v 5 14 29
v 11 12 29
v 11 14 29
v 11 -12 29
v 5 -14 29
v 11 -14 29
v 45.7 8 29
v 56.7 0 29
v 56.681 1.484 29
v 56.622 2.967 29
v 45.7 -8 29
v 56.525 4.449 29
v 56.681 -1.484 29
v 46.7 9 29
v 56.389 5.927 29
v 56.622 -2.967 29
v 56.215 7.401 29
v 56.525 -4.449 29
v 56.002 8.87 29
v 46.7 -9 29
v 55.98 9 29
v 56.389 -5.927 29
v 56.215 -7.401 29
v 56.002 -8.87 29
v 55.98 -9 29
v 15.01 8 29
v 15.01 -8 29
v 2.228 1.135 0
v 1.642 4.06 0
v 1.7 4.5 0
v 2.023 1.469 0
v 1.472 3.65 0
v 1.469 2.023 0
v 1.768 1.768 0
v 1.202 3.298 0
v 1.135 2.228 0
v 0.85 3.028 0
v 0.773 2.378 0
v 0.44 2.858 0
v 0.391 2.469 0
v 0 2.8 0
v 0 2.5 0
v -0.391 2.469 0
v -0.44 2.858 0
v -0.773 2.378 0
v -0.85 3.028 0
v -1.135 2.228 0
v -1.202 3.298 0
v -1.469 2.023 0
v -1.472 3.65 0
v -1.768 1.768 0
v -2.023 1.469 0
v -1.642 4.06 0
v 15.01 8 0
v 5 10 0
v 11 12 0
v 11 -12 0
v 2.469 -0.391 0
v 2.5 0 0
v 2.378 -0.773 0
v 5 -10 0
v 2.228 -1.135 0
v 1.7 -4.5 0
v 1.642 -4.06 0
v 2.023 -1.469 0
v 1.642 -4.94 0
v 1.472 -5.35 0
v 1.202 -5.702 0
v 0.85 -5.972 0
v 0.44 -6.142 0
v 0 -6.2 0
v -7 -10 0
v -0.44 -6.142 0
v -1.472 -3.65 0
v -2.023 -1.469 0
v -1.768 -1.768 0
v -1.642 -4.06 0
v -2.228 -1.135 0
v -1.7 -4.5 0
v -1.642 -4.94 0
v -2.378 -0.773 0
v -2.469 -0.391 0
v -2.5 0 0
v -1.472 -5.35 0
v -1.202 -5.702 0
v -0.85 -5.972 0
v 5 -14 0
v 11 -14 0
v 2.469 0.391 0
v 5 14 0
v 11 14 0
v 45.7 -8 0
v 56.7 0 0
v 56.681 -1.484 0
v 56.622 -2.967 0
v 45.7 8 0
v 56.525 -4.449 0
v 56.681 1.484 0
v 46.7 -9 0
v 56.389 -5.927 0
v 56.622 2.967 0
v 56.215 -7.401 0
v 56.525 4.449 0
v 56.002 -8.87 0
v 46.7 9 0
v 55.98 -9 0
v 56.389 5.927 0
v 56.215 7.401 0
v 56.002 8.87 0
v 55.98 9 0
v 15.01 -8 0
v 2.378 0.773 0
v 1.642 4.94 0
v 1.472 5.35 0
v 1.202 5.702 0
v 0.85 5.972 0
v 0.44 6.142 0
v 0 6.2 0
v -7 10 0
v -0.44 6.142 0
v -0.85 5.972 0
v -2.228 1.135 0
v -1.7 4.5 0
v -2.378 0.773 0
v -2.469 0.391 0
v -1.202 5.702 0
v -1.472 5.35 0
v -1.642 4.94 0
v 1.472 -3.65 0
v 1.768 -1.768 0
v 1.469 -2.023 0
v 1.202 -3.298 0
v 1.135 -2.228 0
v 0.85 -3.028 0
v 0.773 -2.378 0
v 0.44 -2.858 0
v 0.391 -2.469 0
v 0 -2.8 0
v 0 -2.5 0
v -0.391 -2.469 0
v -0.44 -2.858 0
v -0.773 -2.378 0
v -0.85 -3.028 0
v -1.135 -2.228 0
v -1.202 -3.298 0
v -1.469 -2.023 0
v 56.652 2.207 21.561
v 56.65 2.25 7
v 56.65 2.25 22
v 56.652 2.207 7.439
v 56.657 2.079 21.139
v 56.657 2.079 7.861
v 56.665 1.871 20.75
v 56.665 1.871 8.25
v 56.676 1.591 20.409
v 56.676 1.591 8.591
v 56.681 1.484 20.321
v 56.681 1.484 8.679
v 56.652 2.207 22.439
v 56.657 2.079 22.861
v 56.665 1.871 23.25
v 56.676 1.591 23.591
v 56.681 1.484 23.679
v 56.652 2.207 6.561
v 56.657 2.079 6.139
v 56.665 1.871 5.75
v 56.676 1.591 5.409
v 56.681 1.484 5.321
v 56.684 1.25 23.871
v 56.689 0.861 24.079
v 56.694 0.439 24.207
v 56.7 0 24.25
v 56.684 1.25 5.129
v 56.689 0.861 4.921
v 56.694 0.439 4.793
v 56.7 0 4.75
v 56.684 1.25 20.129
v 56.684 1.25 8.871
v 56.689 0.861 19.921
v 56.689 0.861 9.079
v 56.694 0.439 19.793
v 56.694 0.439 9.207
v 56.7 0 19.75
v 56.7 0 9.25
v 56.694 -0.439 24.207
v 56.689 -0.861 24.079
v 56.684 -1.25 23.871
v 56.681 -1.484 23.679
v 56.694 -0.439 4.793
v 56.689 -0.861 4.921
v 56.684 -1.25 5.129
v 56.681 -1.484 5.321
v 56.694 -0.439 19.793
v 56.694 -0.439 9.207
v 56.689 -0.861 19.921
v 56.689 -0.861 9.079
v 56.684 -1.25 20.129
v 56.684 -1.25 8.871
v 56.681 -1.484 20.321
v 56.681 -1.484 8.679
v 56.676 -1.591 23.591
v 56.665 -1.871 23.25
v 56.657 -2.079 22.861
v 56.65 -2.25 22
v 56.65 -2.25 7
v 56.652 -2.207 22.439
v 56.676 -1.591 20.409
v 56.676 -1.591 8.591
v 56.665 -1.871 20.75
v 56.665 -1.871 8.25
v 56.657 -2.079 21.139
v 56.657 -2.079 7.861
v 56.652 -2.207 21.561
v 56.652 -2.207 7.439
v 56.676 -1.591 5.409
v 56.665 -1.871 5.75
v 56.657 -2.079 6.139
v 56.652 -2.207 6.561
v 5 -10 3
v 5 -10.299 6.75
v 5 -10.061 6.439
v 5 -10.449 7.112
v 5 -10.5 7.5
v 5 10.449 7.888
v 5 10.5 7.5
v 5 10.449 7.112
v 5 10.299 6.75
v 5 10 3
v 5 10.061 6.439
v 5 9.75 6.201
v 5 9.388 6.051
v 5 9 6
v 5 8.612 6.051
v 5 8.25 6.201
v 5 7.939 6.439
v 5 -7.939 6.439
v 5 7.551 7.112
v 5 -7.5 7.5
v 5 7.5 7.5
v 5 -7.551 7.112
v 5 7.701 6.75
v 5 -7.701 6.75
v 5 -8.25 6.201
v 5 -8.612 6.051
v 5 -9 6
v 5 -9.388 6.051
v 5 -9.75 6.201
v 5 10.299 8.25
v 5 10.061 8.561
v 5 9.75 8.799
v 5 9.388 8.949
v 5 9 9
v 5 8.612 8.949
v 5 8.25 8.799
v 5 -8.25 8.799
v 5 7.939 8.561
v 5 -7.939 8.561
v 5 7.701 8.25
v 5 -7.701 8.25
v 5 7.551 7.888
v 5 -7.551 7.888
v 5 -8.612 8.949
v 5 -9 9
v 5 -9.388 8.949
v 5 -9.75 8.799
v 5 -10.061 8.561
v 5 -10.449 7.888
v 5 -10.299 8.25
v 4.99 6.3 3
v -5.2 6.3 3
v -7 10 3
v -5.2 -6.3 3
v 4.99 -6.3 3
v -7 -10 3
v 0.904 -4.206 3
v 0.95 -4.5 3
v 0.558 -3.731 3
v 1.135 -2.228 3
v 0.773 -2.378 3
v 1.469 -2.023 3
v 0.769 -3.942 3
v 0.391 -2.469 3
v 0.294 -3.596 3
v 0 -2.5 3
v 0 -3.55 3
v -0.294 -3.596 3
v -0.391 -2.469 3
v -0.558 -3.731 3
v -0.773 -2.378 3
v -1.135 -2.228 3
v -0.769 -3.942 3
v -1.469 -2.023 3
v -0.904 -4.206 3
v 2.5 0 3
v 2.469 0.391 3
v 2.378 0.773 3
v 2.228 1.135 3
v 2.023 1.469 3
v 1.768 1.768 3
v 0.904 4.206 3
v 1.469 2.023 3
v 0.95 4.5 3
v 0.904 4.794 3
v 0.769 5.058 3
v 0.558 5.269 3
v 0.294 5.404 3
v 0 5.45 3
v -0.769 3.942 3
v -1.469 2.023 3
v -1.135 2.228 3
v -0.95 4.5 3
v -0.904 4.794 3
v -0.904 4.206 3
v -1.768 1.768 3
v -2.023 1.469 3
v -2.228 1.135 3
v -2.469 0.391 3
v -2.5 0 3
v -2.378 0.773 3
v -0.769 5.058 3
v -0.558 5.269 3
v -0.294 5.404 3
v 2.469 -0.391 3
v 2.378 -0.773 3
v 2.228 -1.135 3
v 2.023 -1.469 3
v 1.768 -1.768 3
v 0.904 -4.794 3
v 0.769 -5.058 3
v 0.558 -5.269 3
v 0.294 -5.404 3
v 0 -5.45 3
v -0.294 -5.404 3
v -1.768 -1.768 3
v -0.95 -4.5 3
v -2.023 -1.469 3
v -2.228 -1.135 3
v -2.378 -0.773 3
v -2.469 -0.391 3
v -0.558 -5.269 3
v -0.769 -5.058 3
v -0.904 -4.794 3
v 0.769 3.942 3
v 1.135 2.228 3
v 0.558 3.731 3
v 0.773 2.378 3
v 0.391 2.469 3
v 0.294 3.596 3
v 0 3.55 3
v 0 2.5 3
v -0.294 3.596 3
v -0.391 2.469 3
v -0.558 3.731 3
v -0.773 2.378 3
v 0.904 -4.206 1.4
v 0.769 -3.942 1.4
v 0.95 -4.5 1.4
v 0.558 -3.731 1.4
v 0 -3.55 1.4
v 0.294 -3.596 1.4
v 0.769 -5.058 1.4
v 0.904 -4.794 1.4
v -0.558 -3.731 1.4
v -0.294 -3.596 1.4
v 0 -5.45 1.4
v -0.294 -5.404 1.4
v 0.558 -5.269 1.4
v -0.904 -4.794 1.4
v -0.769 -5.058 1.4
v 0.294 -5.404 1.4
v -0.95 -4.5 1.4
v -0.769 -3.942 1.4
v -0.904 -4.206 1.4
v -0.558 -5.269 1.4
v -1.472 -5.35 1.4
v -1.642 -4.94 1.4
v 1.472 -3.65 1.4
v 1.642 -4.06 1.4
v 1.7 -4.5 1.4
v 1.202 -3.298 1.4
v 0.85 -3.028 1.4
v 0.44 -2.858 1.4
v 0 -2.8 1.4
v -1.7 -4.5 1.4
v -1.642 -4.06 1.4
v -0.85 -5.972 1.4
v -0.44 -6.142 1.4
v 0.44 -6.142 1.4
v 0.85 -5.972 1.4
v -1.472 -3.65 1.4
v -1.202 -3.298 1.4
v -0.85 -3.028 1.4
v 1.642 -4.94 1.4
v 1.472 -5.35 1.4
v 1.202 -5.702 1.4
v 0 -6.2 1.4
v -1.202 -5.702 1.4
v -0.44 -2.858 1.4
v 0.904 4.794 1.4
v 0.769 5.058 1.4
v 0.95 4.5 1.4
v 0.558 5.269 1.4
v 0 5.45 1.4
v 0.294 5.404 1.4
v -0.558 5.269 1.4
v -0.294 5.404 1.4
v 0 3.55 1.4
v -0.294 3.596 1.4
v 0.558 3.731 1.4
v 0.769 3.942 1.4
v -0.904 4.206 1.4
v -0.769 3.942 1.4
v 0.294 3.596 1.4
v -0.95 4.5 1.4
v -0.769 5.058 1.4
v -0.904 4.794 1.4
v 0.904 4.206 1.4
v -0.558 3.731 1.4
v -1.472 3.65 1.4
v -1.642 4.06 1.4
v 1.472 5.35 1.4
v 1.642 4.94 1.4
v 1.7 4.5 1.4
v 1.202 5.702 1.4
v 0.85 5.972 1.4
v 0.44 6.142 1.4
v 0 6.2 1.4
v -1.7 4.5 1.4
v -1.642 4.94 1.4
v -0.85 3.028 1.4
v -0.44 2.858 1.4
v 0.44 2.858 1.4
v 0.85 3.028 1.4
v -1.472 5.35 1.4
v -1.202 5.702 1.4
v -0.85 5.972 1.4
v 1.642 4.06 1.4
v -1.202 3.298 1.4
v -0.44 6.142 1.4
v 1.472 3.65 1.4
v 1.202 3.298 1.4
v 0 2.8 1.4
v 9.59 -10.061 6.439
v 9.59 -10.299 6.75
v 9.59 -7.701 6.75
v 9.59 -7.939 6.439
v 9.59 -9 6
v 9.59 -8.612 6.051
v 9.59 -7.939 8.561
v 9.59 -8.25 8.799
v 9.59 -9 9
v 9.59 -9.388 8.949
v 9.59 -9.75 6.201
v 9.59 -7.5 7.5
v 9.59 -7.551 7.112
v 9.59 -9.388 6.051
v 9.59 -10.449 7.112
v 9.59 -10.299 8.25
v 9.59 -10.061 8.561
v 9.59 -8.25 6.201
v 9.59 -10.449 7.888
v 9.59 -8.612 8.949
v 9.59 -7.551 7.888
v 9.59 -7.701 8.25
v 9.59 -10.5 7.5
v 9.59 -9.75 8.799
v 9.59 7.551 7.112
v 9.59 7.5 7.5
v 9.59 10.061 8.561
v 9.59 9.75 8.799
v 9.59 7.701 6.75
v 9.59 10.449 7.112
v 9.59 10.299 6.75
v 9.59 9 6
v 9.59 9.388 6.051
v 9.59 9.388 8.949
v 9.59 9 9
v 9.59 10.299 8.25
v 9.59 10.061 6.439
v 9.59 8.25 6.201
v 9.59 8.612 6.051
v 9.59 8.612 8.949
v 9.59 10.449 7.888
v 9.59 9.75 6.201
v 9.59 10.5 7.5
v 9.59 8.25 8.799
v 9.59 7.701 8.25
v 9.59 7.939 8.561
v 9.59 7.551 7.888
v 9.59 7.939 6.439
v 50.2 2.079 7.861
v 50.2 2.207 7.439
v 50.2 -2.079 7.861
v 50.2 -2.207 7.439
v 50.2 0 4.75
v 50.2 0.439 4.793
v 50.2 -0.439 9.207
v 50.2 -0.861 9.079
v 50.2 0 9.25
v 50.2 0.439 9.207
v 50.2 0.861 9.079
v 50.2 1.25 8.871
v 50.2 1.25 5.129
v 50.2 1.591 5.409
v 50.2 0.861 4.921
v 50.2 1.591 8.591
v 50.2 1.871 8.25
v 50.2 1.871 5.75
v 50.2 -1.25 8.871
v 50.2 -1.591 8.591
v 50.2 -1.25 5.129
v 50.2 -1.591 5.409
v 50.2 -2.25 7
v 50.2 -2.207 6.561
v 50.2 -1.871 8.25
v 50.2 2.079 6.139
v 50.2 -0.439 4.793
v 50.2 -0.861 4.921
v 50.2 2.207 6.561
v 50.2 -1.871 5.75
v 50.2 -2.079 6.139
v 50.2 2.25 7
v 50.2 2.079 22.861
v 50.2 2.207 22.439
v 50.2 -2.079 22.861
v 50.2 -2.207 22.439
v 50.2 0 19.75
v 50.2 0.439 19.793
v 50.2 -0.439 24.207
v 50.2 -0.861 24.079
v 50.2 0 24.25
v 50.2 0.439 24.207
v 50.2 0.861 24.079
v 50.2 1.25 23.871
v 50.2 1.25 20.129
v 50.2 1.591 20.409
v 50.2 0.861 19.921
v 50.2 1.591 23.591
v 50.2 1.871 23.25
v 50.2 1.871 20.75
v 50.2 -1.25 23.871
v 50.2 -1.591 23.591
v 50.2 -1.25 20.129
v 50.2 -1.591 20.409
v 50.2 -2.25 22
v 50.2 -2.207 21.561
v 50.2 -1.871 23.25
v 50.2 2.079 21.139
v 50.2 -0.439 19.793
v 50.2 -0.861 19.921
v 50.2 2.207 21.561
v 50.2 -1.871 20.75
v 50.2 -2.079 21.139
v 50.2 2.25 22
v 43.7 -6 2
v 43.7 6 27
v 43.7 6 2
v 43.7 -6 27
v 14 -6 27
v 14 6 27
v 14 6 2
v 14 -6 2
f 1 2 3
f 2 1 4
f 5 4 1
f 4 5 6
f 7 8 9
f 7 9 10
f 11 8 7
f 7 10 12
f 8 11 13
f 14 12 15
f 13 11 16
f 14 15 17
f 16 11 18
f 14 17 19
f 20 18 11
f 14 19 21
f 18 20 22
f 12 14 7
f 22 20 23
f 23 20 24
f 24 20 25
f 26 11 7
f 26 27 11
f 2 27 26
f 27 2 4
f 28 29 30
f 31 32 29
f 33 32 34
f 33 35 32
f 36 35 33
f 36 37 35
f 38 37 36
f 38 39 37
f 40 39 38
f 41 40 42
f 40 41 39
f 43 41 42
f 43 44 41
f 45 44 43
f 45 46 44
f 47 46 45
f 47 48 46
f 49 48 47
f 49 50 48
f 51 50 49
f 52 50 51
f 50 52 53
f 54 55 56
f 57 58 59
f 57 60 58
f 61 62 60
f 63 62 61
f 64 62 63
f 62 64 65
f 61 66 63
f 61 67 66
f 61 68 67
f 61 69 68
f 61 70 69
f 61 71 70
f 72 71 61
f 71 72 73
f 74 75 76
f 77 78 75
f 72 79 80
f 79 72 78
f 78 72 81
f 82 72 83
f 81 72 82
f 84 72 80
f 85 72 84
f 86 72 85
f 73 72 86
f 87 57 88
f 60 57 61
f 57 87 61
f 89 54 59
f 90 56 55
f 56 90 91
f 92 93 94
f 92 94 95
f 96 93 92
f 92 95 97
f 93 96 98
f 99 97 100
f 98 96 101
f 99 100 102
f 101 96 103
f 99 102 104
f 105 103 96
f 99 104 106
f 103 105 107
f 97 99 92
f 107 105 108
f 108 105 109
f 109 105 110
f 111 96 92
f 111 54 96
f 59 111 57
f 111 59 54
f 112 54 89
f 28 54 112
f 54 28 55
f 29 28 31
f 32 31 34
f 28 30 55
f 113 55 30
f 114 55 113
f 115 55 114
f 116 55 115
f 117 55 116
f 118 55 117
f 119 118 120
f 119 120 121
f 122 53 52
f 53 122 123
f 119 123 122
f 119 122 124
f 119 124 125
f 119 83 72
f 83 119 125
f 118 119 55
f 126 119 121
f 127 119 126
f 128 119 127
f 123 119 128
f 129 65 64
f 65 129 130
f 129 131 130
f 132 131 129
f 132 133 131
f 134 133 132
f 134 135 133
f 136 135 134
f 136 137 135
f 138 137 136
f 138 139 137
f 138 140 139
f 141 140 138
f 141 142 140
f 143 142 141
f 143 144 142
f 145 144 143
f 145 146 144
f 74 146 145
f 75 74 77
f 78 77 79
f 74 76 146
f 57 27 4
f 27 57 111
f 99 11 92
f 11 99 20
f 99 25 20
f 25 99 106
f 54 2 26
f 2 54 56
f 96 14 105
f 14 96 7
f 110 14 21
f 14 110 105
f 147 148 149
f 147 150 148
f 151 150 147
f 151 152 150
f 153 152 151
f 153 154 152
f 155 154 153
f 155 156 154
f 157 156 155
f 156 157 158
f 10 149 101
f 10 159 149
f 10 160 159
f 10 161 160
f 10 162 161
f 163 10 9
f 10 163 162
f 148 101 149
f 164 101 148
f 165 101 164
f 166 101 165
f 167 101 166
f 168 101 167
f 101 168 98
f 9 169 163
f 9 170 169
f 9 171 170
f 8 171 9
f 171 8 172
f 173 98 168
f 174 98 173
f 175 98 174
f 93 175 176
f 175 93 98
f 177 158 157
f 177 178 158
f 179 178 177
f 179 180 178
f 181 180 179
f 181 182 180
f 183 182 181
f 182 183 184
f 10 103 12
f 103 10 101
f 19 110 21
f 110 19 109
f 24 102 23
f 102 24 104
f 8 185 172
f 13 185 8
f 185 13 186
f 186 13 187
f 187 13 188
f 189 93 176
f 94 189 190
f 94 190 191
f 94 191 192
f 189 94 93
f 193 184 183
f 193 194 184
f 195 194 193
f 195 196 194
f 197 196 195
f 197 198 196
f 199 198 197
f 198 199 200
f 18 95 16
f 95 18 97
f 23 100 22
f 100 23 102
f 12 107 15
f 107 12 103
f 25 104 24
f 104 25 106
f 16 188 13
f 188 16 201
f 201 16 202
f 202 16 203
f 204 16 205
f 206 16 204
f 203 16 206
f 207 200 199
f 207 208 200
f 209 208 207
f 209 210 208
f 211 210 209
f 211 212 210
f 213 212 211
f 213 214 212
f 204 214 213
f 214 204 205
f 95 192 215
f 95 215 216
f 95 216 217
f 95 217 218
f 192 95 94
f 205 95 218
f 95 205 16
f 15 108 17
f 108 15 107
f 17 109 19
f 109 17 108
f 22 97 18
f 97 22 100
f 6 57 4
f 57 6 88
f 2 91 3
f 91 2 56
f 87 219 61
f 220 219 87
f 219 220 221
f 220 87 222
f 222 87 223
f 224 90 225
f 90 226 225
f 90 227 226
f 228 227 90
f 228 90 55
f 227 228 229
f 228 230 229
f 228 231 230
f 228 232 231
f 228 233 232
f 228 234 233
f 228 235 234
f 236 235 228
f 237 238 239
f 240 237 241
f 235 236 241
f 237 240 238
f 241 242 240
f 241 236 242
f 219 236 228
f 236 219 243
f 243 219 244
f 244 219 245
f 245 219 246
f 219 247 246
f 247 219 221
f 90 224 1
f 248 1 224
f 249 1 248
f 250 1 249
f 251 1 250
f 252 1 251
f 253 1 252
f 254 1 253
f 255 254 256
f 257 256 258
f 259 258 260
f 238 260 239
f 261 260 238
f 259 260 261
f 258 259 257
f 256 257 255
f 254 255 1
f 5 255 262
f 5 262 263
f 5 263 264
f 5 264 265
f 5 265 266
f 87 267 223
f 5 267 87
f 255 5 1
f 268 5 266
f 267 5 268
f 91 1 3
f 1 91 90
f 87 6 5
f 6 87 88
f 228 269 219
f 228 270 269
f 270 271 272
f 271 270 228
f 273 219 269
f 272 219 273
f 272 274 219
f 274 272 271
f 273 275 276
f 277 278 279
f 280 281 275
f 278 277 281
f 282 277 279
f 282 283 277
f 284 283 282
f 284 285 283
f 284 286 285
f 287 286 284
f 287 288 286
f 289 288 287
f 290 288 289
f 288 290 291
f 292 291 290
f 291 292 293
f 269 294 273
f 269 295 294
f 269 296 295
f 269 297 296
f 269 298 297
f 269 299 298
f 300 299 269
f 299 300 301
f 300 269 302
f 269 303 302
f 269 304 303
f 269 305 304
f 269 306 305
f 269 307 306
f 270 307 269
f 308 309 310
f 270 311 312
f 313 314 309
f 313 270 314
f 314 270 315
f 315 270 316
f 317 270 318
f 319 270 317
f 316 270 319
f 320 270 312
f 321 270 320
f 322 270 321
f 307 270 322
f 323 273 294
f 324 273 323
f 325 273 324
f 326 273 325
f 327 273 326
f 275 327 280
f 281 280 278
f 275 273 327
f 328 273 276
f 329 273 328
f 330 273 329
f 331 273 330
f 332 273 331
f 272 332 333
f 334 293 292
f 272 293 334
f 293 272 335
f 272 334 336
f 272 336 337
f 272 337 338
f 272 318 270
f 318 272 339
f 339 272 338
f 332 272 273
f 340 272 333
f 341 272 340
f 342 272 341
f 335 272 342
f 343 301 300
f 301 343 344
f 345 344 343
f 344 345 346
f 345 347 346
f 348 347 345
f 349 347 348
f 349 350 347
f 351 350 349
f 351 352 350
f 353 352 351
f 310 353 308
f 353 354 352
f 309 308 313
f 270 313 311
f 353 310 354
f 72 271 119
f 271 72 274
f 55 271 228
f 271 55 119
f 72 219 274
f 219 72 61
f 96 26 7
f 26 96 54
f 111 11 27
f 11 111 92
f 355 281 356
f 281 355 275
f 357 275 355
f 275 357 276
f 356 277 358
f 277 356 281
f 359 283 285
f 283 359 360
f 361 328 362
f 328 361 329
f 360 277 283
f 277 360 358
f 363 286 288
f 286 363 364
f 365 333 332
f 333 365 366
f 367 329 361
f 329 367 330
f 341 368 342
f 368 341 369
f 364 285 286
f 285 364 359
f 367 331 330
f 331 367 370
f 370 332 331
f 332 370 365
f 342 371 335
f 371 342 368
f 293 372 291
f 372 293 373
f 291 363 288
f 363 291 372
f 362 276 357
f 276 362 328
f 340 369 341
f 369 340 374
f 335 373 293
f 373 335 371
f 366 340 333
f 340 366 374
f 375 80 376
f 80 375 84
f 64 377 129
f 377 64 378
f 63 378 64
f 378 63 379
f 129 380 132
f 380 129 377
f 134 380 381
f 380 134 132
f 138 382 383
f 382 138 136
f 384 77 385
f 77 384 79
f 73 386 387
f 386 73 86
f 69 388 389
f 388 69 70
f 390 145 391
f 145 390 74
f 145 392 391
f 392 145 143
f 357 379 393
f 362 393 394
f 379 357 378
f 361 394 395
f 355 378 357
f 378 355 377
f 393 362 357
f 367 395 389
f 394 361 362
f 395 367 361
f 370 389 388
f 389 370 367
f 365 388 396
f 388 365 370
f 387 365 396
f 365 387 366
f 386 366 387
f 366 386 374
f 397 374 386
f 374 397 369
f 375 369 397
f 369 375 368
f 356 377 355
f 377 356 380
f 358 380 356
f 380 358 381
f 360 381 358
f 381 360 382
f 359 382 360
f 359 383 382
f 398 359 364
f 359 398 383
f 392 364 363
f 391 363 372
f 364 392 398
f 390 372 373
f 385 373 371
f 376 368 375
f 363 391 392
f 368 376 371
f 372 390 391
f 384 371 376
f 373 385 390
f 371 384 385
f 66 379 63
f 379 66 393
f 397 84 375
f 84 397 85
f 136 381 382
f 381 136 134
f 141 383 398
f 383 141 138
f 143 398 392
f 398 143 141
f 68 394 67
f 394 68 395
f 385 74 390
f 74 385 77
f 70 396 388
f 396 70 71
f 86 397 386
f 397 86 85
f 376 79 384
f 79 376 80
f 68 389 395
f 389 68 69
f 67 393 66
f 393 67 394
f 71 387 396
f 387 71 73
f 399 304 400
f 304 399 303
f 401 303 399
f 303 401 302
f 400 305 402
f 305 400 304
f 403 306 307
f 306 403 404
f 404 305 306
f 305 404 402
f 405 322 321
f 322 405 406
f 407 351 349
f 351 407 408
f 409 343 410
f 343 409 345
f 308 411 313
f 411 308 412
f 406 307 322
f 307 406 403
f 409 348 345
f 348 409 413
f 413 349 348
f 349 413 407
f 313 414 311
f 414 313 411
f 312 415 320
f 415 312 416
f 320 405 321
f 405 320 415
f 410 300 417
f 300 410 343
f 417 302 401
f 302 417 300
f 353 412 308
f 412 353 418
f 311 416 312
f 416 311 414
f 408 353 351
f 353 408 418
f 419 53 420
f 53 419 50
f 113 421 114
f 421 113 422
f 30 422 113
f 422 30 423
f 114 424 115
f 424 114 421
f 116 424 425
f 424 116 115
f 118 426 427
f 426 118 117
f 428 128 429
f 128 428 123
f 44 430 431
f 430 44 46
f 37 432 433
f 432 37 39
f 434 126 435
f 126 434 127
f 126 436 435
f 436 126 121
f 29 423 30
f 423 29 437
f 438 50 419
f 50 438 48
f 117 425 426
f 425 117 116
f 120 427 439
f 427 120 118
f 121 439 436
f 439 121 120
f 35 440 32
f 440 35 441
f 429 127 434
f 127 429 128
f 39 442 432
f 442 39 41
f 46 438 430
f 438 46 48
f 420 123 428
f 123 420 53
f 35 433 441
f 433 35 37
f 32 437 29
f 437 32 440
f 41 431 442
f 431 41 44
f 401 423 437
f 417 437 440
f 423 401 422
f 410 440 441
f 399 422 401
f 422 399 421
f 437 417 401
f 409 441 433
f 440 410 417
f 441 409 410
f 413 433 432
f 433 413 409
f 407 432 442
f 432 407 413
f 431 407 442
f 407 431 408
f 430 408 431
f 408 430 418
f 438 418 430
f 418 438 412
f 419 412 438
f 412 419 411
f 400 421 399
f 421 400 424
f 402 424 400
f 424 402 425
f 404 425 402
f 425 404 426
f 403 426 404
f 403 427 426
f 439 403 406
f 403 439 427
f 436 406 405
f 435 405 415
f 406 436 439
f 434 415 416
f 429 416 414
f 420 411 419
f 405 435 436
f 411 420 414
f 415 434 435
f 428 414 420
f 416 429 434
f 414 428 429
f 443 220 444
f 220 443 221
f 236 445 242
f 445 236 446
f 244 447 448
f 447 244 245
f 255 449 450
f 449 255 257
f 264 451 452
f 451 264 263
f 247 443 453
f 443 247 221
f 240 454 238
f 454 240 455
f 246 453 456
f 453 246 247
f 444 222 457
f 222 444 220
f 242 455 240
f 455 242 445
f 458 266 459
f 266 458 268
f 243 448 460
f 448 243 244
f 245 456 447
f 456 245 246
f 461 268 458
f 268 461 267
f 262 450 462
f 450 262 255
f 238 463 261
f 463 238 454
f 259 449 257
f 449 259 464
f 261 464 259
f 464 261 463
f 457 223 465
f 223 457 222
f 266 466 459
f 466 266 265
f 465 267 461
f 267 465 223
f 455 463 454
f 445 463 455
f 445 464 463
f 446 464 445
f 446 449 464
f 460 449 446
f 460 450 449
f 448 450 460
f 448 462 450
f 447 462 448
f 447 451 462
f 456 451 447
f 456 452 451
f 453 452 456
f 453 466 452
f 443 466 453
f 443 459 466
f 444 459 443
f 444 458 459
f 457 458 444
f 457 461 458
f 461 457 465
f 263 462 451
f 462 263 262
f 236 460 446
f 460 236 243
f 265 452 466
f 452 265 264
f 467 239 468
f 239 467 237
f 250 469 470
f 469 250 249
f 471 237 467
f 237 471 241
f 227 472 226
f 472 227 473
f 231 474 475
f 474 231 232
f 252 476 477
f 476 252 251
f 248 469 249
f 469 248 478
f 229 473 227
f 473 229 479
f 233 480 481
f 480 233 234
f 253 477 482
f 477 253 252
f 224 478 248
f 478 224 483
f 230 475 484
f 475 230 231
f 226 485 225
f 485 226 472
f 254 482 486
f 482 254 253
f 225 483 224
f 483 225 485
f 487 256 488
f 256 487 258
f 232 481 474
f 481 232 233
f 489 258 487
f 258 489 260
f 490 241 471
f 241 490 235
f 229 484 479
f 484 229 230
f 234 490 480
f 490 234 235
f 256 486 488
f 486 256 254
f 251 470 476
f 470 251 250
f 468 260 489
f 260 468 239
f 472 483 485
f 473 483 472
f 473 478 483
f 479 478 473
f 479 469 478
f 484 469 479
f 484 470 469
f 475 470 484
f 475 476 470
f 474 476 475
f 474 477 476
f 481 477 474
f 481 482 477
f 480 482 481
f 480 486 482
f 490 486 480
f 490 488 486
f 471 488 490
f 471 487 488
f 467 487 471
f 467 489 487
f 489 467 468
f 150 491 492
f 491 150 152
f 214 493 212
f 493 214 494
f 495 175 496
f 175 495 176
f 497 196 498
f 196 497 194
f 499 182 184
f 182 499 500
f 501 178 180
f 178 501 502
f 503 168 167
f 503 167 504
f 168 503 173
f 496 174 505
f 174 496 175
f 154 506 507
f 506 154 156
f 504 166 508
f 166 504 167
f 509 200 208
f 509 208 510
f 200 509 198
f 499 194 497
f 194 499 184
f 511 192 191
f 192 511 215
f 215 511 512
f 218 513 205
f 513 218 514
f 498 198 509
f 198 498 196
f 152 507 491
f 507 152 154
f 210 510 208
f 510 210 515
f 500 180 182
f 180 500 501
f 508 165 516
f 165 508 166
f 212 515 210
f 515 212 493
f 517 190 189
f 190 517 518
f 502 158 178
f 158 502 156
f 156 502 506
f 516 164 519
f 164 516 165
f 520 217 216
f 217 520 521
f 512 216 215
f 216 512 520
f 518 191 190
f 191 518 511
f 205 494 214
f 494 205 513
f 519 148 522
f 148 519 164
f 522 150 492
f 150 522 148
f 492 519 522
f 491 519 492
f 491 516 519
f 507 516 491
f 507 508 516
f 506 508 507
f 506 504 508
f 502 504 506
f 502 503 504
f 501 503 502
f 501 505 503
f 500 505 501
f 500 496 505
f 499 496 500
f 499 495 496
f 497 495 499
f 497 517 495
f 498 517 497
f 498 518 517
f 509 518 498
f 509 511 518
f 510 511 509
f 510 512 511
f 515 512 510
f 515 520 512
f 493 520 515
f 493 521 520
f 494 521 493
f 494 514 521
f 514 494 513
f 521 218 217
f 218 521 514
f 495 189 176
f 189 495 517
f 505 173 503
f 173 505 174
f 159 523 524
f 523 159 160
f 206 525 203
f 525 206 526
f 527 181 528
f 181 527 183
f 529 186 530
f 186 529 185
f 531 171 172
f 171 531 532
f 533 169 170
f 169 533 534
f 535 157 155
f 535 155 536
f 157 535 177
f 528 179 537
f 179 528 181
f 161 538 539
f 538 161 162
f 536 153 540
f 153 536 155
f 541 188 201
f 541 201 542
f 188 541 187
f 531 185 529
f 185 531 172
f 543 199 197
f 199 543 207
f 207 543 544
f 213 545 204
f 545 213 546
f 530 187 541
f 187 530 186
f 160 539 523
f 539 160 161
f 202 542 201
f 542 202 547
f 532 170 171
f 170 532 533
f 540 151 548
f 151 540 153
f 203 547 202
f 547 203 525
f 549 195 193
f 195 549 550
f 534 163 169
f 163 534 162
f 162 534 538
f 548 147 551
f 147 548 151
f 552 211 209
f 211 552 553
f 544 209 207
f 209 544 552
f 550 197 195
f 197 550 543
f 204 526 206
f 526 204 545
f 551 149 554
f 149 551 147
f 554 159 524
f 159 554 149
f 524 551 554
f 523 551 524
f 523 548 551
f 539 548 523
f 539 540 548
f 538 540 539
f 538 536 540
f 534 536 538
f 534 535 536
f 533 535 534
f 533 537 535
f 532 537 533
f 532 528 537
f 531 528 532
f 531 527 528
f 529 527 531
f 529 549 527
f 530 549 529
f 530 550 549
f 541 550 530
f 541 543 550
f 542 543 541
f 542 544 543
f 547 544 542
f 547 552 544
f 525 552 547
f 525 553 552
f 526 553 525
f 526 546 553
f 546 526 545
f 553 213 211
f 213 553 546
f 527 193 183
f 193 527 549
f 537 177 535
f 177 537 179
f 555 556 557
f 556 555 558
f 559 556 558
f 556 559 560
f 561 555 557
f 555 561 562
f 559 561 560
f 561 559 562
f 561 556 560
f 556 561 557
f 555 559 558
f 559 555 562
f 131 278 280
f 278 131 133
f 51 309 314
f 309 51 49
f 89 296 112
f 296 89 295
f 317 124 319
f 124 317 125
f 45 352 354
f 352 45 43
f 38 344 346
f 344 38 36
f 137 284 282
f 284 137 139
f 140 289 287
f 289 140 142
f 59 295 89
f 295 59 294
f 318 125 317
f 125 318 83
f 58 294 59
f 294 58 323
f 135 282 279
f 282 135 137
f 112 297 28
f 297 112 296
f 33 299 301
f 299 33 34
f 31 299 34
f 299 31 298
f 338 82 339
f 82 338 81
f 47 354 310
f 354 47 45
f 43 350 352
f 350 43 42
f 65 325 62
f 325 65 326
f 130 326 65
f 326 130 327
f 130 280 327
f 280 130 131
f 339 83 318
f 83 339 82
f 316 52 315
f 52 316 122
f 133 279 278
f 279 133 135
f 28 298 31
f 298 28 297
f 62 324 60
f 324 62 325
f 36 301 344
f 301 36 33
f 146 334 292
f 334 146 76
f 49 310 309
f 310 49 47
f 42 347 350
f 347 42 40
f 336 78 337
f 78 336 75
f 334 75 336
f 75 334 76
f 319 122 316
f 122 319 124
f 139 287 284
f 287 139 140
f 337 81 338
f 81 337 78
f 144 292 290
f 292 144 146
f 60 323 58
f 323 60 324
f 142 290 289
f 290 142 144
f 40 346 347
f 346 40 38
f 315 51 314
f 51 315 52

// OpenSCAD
// =====================================================================
// Downhill Dispatcher — motor ARM v1 (replaces the end cap / motor bar)
// ---------------------------------------------------------------------
// Testing feedback: the N20 wobbled in the zip-tie cradle and the cap
// closed the top. v8 exits objects through the open top of the shell, so
// the motor now hangs off ONE stiff arm bolted to the shell backbone:
//
//   box beam  : 16 x 29 mm closed box (2 mm walls), backbone -> centre
//   end block : bears on the backbone's inside face; 2x M3x6x5 heat-set
//               inserts take 2x M3x8 screws through the backbone pad from
//               OUTSIDE (easy to reach)
//   T-head    : vertical plate at the shaft; the Waveshare N20 bracket
//               clamps the gearbox flat against it. 2x M2x4x3.2 heat-set
//               inserts, M2x6 screws (factory screws are smaller than M2)
//   shelf     : 3 mm floor under the gearbox face (motor can't slide down),
//               optional M1.6 face screws into the gearbox
//   Gearbox face stays at z = 10 above the auger top, so every coupler
//   (v4, mid, v5) still lines up: shaft tip at z = 0.
//
//   strap     : printed copy of the factory bracket, in case its hole
//               spacing doesn't match brk_cc. Same screws.
//
// Frame: z = 0 is the TOP FACE of the upper auger piece. The arm points
// along +X in its own frame; the assembly rotates it to arm_a (shell v8).
// Prints UPRIGHT as exported: every bottom face sits on z = arm_zb, so the
// shelf, beam, T-head and block all start on the bed. No supports (the
// box top is a 12 mm bridge).
// CLI: openscad -D 'part="arm"' -o motor_arm.stl downhill_crown.scad
// =====================================================================

part = "arm"; // [arm, strap, assembly, section]

/* [Shell v8 (downhill_shell.scad)] */
Ri      = 57;          // bore radius
arm_zb  = 7;           // arm underside above the auger top
arm_h   = 29;          // -> backbone top at 36
screw_dz = [7, 22];    // M3 screws above the underside (match shell arm_screw_dz)

/* [Waveshare N20 (DCGM-N20-12V-EN-200RPM)] */
motor_w   = 12.0;      // across the round ends
motor_d   = 10.0;      // across the flats
gear_len  = 9.0;
can_len   = 15.0;
enc_len   = 10.0;      // encoder board + connector (verify)
shaft_len = 10.0;
shaft_d   = 3.0;
face_screw_spacing = 9.0;

/* [Bracket (factory: 25.0 over the ears, 11.6 tall, 11.7 inside)] */
brk_cc    = 18.0;      // hole centre-to-centre. VERIFY: outer-edge-to-outer-edge minus one hole dia
brk_len   = 9.5;       // bracket length along the motor axis (verify)
brk_z     = 4.5;       // bracket centre above the gearbox face (middle of the gearbox)
m2_ins_d  = 3.0;       // M2x4x3.2 insert hole
m2_ins_l  = 4.6;
m2_clear  = 2.4;

/* [Arm] */
face_z    = 10;        // gearbox face above the auger top (fixed: couplers)
th_t      = 6.0;       // T-head plate
th_w      = 28;        // T-head width
box_w     = 16;        // box beam width
box_t     = 2.0;       // box walls
blk_d     = 10;        // end block depth (radial)
blk_w     = 18;        // end block width (fits the 20 mm pad)
shelf_t   = 3;
m3_ins_d  = 4.5;       // M3x6x5 insert hole
m3_ins_l  = 6.5;
face_screws = true;
face_screw_d = 1.9;    // M1.6 clearance
face_head_d  = 3.4;
face_head_h  = 1.4;
boss_hole = 5.0;       // gearbox bushing clearance

$fn = 64;

// ------------------------------ derived -------------------------------
x_th  = motor_d/2;                     // T-head face (motor flat sits on it)
x_th1 = x_th + th_t;
x_blk1 = Ri - 0.3;                     // block outer face (concave on Ri)
x_blk0 = x_blk1 - blk_d;
z0 = arm_zb;  z1 = arm_zb + arm_h;
zb = face_z + brk_z;                   // bracket / insert height

echo(str("ARM: underside z ", z0, " (coupler boss top 6), top z ", z1, ", gearbox face z ", face_z,
         ", motor back ~z ", face_z + gear_len + can_len + enc_len));
echo(str("Bracket inserts M2 at y = +-", brk_cc/2, ", z = ", zb, ".  Box beam ", x_th1, "..", x_blk0, " mm"));
assert(face_z - shelf_t == arm_zb, "shelf underside must be the print bed (= arm underside)");
assert(brk_cc/2 + m2_ins_d/2 + 1.5 < th_w/2, "T-head too narrow for the bracket");
assert(zb + 1.6 + 1 < z1, "insert above the arm top");

// ------------------------------ arm -----------------------------------
module arm() {
    difference() {
        union() {
            // T-head
            translate([x_th, -th_w/2, z0]) cube([th_t, th_w, arm_h]);
            // shelf under the gearbox
            translate([-motor_d/2 - 2, -th_w/2 + 4, z0]) cube([x_th1 + motor_d/2 + 2, th_w - 8, shelf_t]);
            // box beam (outer)
            translate([x_th1 - 0.01, -box_w/2, z0]) cube([x_blk0 - x_th1 + 0.02, box_w, arm_h]);
            // 45 deg flares where the beam meets the T-head and the block (stiff roots)
            for (s = [-1,1]) {
                hull() {
                    translate([x_th1 - 0.01, s > 0 ? box_w/2 - 0.01 : -th_w/2 + 2, z0]) cube([0.01, th_w/2 - box_w/2 - 2 + 0.01, arm_h]);
                    translate([x_th1 + th_w/2 - box_w/2 - 2, s > 0 ? box_w/2 - 0.01 : -box_w/2, z0]) cube([0.01, 0.01, arm_h]);
                }
                hull() {
                    translate([x_blk0, s > 0 ? box_w/2 - 0.01 : -blk_w/2, z0]) cube([0.01, blk_w/2 - box_w/2 + 0.01, arm_h]);
                    translate([x_blk0 - (blk_w/2 - box_w/2), s > 0 ? box_w/2 - 0.01 : -box_w/2, z0]) cube([0.01, 0.01, arm_h]);
                }
            }
            // end block, outer face concave on the bore
            intersection() {
                translate([x_blk0, -blk_w/2, z0]) cube([blk_d, blk_w, arm_h]);
                translate([0,0,z0 - 1]) cylinder(r = x_blk1, h = arm_h + 2, $fn = 240);
            }
        }
        // box hollow (open bottom would print fine too, but closed is stiffer)
        translate([x_th1 + 3, -box_w/2 + box_t, z0 + box_t]) cube([x_blk0 - x_th1 - 6, box_w - 2*box_t, arm_h - 2*box_t]);
        // motor clearance: keep the space in front of the T-head clear above the shelf
        translate([-motor_d/2 - 0.2, -motor_w/2 - 0.3, face_z]) cube([motor_d + 0.2 - 0.01, motor_w + 0.6, 50]);
        // gearbox bushing + face screws through the shelf
        translate([0,0,z0 - 1]) cylinder(d = boss_hole, h = shelf_t + 2, $fn = 40);
        if (face_screws) for (s = [-1,1]) translate([0, s*face_screw_spacing/2, z0 - 1]) {
            cylinder(d = face_screw_d, h = shelf_t + 2, $fn = 20);
            cylinder(d = face_head_d, h = 1 + face_head_h, $fn = 24);
        }
        // bracket inserts (M2) in the T-head, from the motor side
        for (s = [-1,1]) translate([x_th - 0.01, s*brk_cc/2, zb]) rotate([0,90,0]) cylinder(d = m2_ins_d, h = m2_ins_l, $fn = 24);
        // backbone screws: M3 inserts in the end block, from the outer face
        for (dz = screw_dz) translate([x_blk1 + 1, 0, z0 + dz]) rotate([0,-90,0]) cylinder(d = m3_ins_d, h = m3_ins_l + 1, $fn = 32);
    }
}

// ------------------------------ printed strap --------------------------
// copy of the factory bracket: U over the gearbox, two ears with M2 clearance
module strap() {
    u_w = motor_w + 0.3; u_d = motor_d - 0.3;   // slight squeeze across the flats
    t = 1.8; ear = 6.5; et = 2.0;
    difference() {
        union() {
            translate([-u_w/2 - t, -brk_len/2, 0]) cube([u_w + 2*t, brk_len, u_d + t]);
            hull() for (s = [-1,1]) translate([s*brk_cc/2, 0, 0]) cylinder(d = ear, h = et, $fn = 40);
            hull() for (s = [-1,1]) translate([s*brk_cc/2, 0, 0]) translate([-ear/2, -brk_len/2, 0]) cube([ear, brk_len, et]);
        }
        translate([-u_w/2, -brk_len/2 - 1, -1]) cube([u_w, brk_len + 2, u_d + 1]);
        for (s = [-1,1]) translate([s*brk_cc/2, 0, -1]) cylinder(d = m2_clear, h = 10, $fn = 24);
    }
}

// ------------------------------ assembly ------------------------------
module dummy_motor() {
    color("Gainsboro") translate([-motor_d/2, -motor_w/2, face_z]) cube([motor_d, motor_w, gear_len]);
    color("Silver") translate([0,0,face_z + gear_len]) linear_extrude(can_len) intersection() { circle(d = motor_w); square([motor_d, motor_w], center = true); }
    color("Black") translate([-motor_d/2 - 3, -9, face_z + gear_len + can_len]) cube([motor_d + 3, 18, 1.6]);
    color("White") translate([-motor_d/2 - 3, -6, face_z + gear_len + can_len + 1.6]) cube([6, 12, 6]);
    color("Silver") translate([0,0,face_z - shaft_len]) cylinder(d = shaft_d, h = shaft_len, $fn = 24);
}
// strap frame: x = along the ears, y = motor axis, z = out of the ear plane
module bracket_in_place() color("White")
    translate([x_th, 0, zb]) multmatrix([[0,0,-1,0],[1,0,0,0],[0,1,0,0],[0,0,0,1]]) strap();
module assembly() {
    color("Gold") arm();
    dummy_motor();
    bracket_in_place();
    color("SteelBlue", 0.25) difference() { translate([0,0,-40]) cylinder(r = Ri + 2, h = 40 + z1); translate([0,0,-41]) cylinder(r = Ri, h = 100); }
}

if (part == "arm")      translate([0,0,-z0]) arm();                // upright, underside on the bed
if (part == "strap")    strap();                                     // ears down
if (part == "assembly") assembly();
if (part == "section")  difference() { assembly(); translate([-100,0,-50]) cube(200); }
